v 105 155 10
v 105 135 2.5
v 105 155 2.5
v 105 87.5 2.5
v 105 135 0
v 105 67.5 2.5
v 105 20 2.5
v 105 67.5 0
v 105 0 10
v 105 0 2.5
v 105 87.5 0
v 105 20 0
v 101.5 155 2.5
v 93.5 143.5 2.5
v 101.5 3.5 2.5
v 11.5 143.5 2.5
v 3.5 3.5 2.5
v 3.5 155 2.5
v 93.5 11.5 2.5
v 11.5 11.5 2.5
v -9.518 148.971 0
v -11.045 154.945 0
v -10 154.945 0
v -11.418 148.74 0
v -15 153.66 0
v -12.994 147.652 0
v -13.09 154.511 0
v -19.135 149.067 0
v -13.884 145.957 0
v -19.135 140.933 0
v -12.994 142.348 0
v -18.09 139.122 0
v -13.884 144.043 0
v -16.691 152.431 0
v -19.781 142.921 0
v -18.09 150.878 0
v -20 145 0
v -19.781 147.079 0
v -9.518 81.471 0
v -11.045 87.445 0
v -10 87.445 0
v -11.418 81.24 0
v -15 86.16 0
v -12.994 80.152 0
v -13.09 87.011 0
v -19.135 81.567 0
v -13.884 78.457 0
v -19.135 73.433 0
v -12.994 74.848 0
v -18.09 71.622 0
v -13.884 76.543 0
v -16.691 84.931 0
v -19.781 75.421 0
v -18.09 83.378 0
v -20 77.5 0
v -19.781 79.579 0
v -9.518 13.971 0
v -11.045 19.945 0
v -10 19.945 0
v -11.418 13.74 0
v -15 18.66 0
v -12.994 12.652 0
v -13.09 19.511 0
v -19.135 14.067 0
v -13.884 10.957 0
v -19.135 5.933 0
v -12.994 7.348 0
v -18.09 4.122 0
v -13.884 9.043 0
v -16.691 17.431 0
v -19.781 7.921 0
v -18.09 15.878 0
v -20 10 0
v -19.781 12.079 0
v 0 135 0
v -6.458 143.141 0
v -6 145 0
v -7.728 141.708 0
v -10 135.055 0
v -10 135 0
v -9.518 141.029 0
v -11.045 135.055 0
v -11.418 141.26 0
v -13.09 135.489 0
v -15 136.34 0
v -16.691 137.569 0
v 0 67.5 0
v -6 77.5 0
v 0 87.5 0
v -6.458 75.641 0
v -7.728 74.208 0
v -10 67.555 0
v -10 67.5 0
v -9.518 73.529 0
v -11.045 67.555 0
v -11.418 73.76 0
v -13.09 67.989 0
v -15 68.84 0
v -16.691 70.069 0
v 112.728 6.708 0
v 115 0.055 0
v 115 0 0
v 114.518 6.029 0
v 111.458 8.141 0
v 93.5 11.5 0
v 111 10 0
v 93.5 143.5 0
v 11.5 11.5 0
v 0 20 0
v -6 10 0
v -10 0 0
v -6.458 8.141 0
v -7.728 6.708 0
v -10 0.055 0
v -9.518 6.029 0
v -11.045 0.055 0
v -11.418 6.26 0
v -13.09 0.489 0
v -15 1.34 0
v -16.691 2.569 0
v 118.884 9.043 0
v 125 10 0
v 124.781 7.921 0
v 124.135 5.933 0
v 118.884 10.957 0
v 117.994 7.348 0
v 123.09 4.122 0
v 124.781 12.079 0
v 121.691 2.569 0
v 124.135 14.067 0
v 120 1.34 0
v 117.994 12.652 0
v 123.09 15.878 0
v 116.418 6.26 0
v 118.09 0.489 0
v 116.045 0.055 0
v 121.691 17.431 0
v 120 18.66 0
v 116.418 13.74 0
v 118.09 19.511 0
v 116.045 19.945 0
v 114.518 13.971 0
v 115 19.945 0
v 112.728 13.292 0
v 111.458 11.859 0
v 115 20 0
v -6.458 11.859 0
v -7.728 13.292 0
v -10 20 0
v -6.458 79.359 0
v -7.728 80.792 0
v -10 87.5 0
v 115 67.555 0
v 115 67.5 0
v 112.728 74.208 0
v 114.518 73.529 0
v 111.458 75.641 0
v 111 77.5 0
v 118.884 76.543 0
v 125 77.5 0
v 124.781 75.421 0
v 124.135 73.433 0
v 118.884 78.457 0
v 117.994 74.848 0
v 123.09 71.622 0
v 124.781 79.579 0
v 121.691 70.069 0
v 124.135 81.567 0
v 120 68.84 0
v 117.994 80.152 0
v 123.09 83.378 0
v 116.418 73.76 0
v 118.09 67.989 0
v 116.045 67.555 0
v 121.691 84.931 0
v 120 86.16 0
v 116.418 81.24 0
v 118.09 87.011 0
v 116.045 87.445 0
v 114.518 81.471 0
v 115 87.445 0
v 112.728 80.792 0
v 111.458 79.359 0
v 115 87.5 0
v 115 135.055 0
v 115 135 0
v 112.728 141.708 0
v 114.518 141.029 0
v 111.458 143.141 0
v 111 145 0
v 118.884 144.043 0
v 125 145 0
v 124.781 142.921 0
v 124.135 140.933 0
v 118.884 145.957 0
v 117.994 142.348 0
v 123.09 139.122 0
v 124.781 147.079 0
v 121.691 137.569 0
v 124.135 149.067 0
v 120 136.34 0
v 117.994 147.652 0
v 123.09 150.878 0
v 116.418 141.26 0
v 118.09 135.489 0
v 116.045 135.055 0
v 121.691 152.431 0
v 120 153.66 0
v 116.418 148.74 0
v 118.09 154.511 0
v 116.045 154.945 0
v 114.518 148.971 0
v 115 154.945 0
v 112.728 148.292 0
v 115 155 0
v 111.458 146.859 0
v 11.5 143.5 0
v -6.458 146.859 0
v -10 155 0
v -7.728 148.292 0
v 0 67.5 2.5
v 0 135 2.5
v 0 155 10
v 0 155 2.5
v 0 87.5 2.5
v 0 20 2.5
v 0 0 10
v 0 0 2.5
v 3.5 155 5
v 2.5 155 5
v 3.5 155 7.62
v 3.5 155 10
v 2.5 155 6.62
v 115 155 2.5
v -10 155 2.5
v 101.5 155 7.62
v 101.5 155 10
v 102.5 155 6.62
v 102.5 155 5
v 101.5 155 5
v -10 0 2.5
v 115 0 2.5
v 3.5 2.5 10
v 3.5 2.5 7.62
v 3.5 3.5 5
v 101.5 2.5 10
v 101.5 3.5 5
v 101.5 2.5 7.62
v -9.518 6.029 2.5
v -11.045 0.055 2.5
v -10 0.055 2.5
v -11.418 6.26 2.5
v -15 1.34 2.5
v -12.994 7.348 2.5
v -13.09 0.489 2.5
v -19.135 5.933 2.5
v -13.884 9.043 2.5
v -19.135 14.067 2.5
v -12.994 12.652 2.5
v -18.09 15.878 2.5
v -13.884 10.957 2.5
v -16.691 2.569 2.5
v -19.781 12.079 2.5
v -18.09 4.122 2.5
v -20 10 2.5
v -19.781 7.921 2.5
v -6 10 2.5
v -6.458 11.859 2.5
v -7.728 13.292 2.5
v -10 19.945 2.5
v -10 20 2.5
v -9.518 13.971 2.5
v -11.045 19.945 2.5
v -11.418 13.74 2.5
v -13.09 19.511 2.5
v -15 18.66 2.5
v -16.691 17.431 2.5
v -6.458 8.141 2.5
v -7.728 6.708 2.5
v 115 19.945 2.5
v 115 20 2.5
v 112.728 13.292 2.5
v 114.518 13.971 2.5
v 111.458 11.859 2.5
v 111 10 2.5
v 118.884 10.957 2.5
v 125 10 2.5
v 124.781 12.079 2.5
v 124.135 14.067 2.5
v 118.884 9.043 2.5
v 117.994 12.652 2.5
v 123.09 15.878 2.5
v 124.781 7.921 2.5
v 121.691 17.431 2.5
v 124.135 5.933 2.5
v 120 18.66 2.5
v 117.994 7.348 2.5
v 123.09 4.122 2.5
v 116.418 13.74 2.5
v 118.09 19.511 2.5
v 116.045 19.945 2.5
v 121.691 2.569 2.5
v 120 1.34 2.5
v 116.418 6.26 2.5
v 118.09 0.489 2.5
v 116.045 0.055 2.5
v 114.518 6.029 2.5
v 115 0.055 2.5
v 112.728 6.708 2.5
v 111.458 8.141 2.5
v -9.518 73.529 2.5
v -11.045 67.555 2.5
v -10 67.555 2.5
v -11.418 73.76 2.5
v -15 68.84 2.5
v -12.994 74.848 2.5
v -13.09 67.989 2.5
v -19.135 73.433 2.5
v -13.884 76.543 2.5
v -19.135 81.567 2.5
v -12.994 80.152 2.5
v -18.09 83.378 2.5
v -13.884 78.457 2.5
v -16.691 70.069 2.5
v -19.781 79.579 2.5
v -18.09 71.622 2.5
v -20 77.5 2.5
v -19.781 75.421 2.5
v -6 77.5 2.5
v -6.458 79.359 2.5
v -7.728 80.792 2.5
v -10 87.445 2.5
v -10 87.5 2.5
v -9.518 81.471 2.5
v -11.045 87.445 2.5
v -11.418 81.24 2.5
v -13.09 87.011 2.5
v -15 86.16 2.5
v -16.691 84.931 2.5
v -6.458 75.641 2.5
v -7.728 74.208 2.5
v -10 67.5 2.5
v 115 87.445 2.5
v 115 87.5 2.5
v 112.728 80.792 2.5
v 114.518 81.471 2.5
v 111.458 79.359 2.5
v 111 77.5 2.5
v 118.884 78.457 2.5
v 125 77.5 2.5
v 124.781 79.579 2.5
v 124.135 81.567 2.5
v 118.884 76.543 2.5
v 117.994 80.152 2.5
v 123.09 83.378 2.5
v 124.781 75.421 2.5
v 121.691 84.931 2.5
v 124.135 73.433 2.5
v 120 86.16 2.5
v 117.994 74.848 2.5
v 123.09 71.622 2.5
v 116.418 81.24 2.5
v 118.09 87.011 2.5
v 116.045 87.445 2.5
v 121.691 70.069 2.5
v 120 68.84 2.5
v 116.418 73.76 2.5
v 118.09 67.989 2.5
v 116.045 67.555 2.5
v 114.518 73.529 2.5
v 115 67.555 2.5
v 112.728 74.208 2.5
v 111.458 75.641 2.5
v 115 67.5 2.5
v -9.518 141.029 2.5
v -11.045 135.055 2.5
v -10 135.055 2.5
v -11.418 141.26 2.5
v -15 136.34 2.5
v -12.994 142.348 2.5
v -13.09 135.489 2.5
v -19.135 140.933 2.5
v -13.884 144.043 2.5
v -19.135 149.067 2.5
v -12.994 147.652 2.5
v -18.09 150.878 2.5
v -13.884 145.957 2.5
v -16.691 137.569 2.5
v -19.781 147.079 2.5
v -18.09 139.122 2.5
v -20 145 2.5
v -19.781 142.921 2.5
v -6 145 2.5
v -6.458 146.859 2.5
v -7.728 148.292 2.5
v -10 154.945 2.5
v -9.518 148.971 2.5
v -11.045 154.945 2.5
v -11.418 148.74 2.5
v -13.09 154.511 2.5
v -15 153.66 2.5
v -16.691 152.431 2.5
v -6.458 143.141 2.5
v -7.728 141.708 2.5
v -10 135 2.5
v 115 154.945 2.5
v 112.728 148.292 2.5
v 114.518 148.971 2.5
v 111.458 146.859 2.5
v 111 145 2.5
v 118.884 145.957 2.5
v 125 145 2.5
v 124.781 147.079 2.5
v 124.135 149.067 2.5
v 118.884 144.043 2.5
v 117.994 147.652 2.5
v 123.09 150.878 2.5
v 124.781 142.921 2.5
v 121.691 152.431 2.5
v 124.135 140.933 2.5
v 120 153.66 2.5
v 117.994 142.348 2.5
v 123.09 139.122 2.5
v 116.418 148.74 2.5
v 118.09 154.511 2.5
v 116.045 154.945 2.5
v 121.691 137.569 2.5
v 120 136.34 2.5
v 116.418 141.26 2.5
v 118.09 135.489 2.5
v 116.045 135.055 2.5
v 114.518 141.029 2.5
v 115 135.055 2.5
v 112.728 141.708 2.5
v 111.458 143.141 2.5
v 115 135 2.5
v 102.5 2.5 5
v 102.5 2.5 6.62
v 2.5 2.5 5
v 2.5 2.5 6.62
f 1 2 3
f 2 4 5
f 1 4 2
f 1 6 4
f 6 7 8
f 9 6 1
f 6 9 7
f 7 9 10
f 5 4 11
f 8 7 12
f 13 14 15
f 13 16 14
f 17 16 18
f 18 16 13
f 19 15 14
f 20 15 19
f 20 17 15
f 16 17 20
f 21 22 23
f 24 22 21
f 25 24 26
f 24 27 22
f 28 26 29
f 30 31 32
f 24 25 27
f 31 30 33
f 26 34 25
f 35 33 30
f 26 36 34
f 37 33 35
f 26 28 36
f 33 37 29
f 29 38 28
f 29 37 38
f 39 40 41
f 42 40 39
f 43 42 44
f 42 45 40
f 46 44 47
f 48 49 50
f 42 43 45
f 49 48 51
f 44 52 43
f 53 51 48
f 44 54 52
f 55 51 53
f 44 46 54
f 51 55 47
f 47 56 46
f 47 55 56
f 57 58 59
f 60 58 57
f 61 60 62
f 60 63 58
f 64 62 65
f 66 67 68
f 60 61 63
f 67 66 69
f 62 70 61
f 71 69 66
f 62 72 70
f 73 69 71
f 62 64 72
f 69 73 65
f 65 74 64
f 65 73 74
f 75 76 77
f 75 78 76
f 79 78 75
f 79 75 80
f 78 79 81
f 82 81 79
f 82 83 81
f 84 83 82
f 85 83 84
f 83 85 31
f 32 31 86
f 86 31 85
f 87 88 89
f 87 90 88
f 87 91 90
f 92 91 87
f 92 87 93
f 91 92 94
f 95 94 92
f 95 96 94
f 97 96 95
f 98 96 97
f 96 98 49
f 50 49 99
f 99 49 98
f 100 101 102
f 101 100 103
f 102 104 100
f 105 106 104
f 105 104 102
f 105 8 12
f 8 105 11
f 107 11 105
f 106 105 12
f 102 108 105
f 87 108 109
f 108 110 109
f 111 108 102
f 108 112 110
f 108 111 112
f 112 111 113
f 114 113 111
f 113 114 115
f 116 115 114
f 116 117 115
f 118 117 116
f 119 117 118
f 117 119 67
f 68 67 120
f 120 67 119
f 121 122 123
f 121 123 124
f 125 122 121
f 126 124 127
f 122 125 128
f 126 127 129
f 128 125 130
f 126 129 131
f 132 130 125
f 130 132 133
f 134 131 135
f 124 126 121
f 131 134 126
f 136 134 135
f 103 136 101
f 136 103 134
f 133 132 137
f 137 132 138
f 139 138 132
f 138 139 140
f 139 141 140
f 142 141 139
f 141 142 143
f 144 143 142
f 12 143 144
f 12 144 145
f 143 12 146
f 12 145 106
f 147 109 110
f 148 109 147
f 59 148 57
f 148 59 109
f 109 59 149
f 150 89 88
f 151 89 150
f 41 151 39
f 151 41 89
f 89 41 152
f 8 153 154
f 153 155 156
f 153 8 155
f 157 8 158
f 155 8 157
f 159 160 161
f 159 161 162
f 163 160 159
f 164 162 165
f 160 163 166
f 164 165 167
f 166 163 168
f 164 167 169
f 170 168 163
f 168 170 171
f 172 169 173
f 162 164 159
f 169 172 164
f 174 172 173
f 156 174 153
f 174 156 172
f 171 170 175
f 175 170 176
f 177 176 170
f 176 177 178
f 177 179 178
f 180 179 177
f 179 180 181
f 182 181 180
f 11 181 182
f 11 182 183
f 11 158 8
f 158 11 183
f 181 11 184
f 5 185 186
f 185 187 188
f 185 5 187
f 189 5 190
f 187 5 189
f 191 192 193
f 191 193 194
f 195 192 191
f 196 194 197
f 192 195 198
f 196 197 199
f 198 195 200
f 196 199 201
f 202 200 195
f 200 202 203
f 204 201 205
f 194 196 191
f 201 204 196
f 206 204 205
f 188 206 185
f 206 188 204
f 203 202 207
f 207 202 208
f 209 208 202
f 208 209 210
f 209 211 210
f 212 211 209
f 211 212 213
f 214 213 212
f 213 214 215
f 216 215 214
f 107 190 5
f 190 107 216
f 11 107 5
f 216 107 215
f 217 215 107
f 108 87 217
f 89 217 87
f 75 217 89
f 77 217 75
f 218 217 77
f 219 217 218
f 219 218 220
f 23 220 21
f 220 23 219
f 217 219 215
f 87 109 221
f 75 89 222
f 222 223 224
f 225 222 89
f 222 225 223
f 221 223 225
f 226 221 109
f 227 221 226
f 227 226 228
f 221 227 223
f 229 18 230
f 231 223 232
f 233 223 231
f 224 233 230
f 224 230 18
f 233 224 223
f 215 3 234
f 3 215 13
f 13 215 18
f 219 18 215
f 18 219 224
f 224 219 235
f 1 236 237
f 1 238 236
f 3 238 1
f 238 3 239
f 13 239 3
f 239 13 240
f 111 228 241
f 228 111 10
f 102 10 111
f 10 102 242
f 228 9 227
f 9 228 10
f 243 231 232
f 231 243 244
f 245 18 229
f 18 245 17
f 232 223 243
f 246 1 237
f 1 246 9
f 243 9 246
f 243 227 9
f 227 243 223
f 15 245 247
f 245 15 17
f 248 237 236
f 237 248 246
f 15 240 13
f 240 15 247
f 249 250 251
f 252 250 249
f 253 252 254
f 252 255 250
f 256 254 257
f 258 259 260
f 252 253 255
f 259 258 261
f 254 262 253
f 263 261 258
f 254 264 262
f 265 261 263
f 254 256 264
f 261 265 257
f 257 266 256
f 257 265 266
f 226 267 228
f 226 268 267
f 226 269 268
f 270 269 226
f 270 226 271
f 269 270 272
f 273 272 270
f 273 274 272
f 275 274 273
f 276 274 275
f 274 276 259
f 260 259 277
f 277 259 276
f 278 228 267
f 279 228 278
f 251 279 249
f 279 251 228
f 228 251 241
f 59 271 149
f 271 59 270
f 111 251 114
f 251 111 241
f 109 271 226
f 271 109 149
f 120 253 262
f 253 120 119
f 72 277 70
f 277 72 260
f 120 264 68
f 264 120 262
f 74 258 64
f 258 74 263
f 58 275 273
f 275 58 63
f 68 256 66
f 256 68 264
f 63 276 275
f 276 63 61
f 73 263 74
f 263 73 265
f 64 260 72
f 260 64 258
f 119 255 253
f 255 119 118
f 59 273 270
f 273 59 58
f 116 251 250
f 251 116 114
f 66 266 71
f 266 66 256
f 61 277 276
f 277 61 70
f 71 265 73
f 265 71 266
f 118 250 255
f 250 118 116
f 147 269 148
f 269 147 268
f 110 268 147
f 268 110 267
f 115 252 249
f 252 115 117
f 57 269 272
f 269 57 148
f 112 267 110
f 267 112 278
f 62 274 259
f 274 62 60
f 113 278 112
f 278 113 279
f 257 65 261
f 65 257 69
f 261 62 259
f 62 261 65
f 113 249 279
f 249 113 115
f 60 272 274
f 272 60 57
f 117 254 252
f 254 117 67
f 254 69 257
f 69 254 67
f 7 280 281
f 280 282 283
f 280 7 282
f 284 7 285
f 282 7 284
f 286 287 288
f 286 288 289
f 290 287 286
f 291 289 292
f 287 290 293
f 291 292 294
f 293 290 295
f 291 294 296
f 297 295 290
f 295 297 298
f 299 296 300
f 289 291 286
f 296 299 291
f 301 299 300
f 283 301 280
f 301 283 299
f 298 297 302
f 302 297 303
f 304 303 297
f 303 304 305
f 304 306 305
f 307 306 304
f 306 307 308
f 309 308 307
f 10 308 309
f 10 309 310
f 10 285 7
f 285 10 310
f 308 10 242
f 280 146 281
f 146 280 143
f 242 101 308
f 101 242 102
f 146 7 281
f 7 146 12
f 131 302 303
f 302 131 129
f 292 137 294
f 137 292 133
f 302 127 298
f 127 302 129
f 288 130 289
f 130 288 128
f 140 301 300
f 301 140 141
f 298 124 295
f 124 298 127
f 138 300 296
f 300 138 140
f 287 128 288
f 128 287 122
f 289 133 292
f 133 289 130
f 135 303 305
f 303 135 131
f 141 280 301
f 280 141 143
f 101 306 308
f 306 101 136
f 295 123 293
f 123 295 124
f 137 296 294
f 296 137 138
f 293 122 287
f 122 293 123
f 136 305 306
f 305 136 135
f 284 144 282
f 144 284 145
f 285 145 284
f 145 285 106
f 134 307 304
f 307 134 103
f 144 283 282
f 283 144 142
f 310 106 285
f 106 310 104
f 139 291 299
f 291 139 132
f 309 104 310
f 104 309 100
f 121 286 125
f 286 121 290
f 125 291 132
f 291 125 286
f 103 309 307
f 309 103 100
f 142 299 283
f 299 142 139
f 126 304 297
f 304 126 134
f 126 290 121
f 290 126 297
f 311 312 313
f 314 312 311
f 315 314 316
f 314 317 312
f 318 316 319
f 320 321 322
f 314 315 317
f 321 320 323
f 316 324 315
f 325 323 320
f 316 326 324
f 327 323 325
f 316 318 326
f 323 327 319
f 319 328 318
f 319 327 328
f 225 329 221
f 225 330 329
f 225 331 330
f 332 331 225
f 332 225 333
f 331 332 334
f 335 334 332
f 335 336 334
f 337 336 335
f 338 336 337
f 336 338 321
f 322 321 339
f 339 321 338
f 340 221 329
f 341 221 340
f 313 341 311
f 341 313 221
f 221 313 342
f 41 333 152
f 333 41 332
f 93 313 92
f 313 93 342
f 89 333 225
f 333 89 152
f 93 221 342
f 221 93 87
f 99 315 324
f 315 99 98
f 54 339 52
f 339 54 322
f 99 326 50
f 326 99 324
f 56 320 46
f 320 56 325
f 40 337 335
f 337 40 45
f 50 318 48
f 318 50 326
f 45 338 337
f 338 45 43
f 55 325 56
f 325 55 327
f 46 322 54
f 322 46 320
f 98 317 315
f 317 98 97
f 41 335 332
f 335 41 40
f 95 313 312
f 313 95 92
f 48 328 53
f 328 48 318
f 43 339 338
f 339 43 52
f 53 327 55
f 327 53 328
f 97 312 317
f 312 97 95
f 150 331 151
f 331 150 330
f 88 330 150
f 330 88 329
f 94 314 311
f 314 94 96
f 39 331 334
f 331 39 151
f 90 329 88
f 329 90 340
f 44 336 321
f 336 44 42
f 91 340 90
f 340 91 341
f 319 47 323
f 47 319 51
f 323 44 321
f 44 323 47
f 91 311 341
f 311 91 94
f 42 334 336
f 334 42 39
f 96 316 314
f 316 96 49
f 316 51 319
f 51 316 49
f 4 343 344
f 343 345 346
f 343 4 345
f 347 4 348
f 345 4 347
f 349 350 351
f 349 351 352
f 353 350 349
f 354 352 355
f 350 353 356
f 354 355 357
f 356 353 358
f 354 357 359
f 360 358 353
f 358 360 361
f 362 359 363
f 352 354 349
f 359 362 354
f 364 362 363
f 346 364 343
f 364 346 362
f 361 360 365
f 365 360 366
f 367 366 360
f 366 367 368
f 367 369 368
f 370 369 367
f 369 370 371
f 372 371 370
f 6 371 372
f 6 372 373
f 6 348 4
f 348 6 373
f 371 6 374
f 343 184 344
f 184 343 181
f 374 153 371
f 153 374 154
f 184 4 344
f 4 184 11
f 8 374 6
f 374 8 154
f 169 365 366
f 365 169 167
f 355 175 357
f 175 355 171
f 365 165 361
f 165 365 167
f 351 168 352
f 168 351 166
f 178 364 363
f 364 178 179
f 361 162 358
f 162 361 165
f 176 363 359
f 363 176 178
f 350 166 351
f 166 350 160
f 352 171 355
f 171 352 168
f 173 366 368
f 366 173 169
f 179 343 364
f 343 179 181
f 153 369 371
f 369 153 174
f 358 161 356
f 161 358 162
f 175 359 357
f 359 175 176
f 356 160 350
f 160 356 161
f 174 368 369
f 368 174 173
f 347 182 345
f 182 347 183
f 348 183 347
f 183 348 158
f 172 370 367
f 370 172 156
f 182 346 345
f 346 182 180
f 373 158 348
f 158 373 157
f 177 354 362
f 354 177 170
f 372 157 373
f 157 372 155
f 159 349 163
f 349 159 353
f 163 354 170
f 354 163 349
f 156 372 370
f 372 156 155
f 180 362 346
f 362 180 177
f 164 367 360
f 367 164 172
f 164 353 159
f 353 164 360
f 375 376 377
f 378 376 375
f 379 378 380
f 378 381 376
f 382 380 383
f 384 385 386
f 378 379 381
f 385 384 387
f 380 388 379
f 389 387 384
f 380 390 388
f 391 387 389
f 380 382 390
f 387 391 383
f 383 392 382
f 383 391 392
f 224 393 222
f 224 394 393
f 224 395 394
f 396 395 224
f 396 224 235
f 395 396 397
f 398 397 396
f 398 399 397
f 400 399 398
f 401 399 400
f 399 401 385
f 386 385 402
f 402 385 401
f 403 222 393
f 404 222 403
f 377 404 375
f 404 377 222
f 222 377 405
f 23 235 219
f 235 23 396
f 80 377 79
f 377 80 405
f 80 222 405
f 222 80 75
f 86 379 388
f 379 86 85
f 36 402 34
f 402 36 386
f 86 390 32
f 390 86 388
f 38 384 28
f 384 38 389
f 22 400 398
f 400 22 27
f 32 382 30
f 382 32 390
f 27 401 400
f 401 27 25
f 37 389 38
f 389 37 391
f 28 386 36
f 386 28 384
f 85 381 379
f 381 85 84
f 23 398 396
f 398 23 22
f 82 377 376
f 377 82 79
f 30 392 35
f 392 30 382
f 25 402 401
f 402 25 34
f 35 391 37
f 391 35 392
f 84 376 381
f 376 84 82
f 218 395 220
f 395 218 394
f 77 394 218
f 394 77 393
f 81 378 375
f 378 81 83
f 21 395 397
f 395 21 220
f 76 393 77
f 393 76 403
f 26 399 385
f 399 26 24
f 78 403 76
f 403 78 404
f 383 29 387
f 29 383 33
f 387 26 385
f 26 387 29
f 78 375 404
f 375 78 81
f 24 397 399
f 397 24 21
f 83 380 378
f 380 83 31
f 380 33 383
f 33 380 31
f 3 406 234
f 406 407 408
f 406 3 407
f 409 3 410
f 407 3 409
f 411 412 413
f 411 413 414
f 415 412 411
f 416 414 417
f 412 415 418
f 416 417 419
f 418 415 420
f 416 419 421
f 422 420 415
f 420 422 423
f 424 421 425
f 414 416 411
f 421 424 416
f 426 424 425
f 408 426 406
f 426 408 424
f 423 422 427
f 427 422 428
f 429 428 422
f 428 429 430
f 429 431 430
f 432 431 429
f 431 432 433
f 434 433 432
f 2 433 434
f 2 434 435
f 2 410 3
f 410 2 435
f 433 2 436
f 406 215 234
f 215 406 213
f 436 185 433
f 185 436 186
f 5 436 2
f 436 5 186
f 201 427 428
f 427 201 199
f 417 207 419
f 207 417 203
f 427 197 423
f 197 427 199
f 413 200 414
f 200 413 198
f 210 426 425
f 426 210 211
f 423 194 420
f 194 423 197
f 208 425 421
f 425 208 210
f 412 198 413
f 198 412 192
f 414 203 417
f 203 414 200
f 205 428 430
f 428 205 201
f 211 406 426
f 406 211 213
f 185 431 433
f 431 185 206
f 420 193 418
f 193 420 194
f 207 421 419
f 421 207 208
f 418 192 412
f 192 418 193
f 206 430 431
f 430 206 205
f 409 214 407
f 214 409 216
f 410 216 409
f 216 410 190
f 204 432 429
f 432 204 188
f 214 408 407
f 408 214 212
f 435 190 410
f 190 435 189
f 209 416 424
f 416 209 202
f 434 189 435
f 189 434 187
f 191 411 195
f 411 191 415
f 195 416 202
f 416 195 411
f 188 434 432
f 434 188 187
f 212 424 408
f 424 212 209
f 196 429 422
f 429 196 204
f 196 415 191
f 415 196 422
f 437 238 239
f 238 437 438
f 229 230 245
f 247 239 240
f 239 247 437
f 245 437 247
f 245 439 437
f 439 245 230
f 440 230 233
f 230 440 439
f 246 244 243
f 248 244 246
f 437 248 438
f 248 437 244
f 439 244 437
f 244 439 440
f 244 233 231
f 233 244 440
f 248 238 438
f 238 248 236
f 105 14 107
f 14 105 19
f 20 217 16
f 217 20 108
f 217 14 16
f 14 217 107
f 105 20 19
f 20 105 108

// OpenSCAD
// [FL_INDEX: keywords="openscad, 3d_parametric, PCB_Support, csg_solid" | COT="Parametric OpenSCAD design from 3DCodeverse"]
// Title: PCB Support

/* pcb_box_slide_with_tabs.scad
 * By Nicholas C Lewis - Jan 1, 2011
 * http://www.thingiverse.com/thing:5396 
 *
 * derived from pcb_box_slide.scad 
 *     Parametric, open PCB-box (slide-in) by chlunde
 *     http://www.thingiverse.com/thing:4071
 *
 * CHANGES
 * - adjusted to fit Arduino Mega
 * - added mounting tabs
 * - turned off cutouts
 * - adjusted bottom cutout size
 */

//CUSTOMIZER VARIABLES
// PCB width
pcb_width_text_box = 100;
// PCB length
pcb_length_text_box = 150;
// PCB height
pcb_height_text_box = 1.62;
// PCB bottom margin
pcb_bottom_margin_text_box = 2.5;
// Wall width tick
wall_width_thick_text_box = 3.5;
// Tab hole radius
tab_hole_radius_text_box = 4;
// Tab outer radius
tab_outer_radius_text_box = 7;
// Box height
box_height_text_box = 10;
//CUSTOMIZER VARIABLES END

pcb_width = pcb_width_text_box;
pcb_length = pcb_length_text_box;
pcb_height = pcb_height_text_box;
slisse = 1;

pcb_bottom_margin = pcb_bottom_margin_text_box;
wall_width_thick = wall_width_thick_text_box;
wall_width = wall_width_thick-slisse;
box_height = box_height_text_box;

//tab parameters
tab_hole_radius=tab_hole_radius_text_box;
tab_outer_radius=box_height_text_box;



module tab() {
	difference(){
		union() {
			translate([-tab_outer_radius,-tab_outer_radius,0])
			cube([tab_outer_radius,2*tab_outer_radius,wall_width]);
			translate([-tab_outer_radius,0,0])
				cylinder(r=tab_outer_radius, h = wall_width);
		}
		translate([-tab_outer_radius,0,0])
		cylinder(r= tab_hole_radius, h = wall_width+3,center=true);
	}

}

module box() {
  union() {
    cube([pcb_width + 2*wall_width, pcb_length + 2*wall_width, wall_width]);

    cube([wall_width_thick, pcb_length + 2*wall_width, box_height]);

    cube([pcb_width + 2*wall_width, wall_width_thick, box_height]);

    %translate([0, pcb_length+wall_width, 0])
      cube([pcb_width + 2*wall_width,wall_width,box_height]);

    translate([pcb_width + wall_width - slisse,0,0])
      cube([wall_width_thick, pcb_length + 2*wall_width, box_height]);
  }
//comment out this part to remove tabs
 for(i=[tab_outer_radius,(pcb_length + 2*wall_width)/2,pcb_length + 2*wall_width-tab_outer_radius]){
	translate([0,i,0])tab();
	translate([pcb_width + 2*wall_width,i,0])mirror()tab();
 }


}

module pcb() {
  translate([wall_width, wall_width, wall_width + pcb_bottom_margin])
    cube([pcb_width,pcb_length + wall_width + 0.1,pcb_height]);
  translate([wall_width, wall_width, wall_width + pcb_bottom_margin+pcb_height])rotate([0,45,0])
    cube([pcb_height,pcb_length + wall_width + 0.1,pcb_height]);
  translate([wall_width+pcb_width-2*cos(45)*pcb_height, wall_width, wall_width + pcb_bottom_margin+pcb_height])rotate([0,45,0])
    cube([pcb_height,pcb_length + wall_width + 0.1,pcb_height]);
  translate([wall_width_thick, wall_width, wall_width + pcb_bottom_margin])
    cube([pcb_width-2*slisse,pcb_length + wall_width + 0.1,box_height]);

}



module holes() {
  *translate([wall_width + pcb_width/2, wall_width_thick + 0.1, pcb_width/2+wall_width])
    rotate(a=90,v=[1,0,0])
      cylinder(r=pcb_width/2, h=wall_width_thick + 0.2);

  *translate([-0.1, wall_width + pcb_length/2, pcb_length/2 + wall_width])
    rotate(a=90,v=[0,1,0])
      cylinder(r=pcb_length/2, h=wall_width_thick + 0.2);

  *translate([pcb_width + wall_width - slisse - 0.1, wall_width + pcb_length/2, pcb_length/2 + wall_width])
    rotate(a=90,v=[0,1,0])
      cylinder(r=pcb_length/2, h=wall_width_thick + 0.2);

 * translate([pcb_width/2 + wall_width, wall_width + pcb_length/2, -0.1])
    rotate(a=0,v=[0,1,0])
      cylinder(r=min(pcb_length,pcb_width)/2 - wall_width/2, h=wall_width_thick + 0.2);
   
  inner_margin = 9;
  translate([inner_margin +wall_width, inner_margin+wall_width, -0.1])
    cube([pcb_width-inner_margin*2,pcb_length -inner_margin*2,wall_width + 0.2]);
}

difference() {
  box();
  pcb();
  holes();
}

* color([1,0,0])
  translate([pcb_width/2 + wall_width, wall_width + pcb_length/2, -0.1])
    rotate(a=0,v=[0,1,0])
      cylinder(r=min(pcb_length,pcb_width)/2 - wall_width/2, h=wall_width_thick + 0.2);
